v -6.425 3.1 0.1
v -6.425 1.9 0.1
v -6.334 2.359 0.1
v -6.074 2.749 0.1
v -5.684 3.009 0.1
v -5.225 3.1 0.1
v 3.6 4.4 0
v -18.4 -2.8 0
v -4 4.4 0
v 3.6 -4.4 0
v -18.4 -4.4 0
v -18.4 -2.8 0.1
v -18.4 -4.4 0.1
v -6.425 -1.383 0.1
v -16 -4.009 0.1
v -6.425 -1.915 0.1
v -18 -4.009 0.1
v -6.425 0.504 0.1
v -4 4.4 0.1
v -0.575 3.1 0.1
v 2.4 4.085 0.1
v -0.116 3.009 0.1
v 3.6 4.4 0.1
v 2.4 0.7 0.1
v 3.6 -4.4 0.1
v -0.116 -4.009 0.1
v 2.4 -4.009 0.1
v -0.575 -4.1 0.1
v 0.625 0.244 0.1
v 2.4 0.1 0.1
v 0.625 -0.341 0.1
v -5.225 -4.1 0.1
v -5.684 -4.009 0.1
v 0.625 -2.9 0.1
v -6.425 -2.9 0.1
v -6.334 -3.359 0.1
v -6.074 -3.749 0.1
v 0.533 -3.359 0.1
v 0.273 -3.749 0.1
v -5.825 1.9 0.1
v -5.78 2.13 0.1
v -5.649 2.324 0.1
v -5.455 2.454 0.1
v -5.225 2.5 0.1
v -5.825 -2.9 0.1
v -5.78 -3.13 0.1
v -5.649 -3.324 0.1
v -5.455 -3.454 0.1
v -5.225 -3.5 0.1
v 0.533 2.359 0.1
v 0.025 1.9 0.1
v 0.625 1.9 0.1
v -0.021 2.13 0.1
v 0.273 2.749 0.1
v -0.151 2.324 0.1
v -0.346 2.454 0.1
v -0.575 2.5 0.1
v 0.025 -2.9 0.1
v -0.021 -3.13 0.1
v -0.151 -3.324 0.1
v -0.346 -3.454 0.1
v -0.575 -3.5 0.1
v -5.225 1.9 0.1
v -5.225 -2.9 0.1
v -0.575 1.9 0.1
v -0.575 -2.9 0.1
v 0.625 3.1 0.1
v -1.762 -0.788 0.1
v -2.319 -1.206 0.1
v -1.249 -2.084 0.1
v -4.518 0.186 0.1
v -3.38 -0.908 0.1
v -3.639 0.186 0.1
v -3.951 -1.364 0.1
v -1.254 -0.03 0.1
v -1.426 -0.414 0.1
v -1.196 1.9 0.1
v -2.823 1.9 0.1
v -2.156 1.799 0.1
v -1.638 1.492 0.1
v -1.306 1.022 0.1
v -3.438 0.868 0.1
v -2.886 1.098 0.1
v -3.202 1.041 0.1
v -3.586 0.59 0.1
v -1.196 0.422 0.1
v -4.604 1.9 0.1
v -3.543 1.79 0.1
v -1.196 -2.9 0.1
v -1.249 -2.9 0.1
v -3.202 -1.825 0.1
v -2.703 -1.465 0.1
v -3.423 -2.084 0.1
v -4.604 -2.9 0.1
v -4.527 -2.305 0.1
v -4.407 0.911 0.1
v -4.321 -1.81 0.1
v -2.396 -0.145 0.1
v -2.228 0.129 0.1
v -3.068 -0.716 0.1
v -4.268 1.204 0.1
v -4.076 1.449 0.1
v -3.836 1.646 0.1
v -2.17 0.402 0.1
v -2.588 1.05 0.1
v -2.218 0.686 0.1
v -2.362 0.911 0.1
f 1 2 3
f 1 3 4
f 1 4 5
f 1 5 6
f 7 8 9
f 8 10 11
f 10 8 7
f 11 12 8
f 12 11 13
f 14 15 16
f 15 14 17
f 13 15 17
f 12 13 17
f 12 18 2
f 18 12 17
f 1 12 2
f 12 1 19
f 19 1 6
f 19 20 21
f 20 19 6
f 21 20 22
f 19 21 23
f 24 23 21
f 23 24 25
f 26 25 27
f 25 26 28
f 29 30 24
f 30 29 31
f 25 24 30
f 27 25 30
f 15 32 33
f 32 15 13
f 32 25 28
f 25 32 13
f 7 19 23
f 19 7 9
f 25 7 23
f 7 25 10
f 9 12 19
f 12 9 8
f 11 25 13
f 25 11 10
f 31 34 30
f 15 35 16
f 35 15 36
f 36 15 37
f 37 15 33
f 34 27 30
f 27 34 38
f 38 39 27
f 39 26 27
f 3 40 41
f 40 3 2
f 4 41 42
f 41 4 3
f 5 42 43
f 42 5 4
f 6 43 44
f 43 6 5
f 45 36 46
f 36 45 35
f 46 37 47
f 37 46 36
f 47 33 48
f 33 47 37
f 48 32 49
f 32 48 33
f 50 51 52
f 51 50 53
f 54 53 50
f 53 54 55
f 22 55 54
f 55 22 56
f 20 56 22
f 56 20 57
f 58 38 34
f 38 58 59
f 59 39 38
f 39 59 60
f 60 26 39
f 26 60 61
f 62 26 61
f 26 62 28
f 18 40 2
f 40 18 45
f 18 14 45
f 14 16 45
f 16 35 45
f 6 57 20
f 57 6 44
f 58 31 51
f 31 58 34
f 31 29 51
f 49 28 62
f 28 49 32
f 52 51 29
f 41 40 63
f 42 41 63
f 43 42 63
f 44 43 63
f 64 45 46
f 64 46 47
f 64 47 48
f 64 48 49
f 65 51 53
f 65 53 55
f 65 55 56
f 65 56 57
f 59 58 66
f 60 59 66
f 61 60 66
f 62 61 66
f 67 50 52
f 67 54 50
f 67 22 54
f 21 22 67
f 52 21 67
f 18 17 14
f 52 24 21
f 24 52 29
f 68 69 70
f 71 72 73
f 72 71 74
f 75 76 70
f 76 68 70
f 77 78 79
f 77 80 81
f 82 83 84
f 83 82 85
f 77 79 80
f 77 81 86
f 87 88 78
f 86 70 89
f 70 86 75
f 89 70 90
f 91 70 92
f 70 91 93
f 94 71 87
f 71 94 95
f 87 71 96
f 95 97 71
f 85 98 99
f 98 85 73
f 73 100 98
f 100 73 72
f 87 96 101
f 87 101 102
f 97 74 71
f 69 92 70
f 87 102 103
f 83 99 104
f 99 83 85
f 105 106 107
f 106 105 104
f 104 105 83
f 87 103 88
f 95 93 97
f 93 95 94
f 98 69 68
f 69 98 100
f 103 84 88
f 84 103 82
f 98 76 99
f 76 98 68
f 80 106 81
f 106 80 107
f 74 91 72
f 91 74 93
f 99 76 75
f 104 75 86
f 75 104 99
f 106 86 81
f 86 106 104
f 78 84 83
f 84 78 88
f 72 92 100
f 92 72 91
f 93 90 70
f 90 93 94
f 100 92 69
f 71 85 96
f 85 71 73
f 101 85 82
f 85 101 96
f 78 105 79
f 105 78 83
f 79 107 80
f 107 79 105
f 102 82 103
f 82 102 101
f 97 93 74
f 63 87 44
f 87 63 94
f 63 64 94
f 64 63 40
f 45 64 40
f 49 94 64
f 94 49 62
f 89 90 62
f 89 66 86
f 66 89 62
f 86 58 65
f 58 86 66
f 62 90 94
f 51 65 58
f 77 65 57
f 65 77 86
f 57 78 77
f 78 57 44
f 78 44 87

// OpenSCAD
// file: ../p/1-4ndis.scad
use <../lib.scad>
function ldraw_lib__1_4ndis() = [
// 0 Disc Negative 0.25
// 0 Name: 1-4ndis.dat
// 0 Author: James Jessiman
// 0 !LDRAW_ORG Primitive UPDATE 2012-01
// 0 !LICENSE Licensed under CC BY 2.0 and CC BY 4.0 : see CAreadme.txt
// 
// 0 BFC CERTIFY CCW
  [0,"BFC","CERTIFY"],
  [0,"BFC","CCW"],
// 
// 0 !HISTORY 2002-03-23 [sbliss] Added BFC Statement
// 0 !HISTORY 2002-04-25 [PTadmin] Official Update 2002-02
// 0 !HISTORY 2007-06-22 [PTadmin] Header formatted for Contributor Agreement
// 0 !HISTORY 2008-07-01 [PTadmin] Official Update 2008-01
// 0 !HISTORY 2012-02-16 [Philo] Changed to CCW
// 0 !HISTORY 2012-03-30 [PTadmin] Official Update 2012-01
// 
// 
// 3 16 0.9239 0 0.3827 1 0 0 1 0 1
  [3,16,0.9239,0,0.3827,1,0,0,1,0,1],
// 3 16 0.7071 0 0.7071 0.9239 0 0.3827 1 0 1
  [3,16,0.7071,0,0.7071,0.9239,0,0.3827,1,0,1],
// 3 16 0.3827 0 0.9239 0.7071 0 0.7071 1 0 1
  [3,16,0.3827,0,0.9239,0.7071,0,0.7071,1,0,1],
// 3 16 0 0 1 0.3827 0 0.9239 1 0 1
  [3,16,0,0,1,0.3827,0,0.9239,1,0,1],
];
module ldraw_lib__1_4ndis(step=0, col=false, unit=2/5, alt=false, line=0.2, solid=!$preview)
    makepoly(ldraw_lib__1_4ndis(), step=step, col=col, unit=unit, alt=alt, line=line, solid=solid);
ldraw_lib__1_4ndis(line=0.2);
// file: ../p/3-16ndis.scad
use <../lib.scad>
function ldraw_lib__3_16ndis() = [
// 0 Disc Negative 0.1875
// 0 Name: 3-16ndis.dat
// 0 Author: Guy Vivan [guyvivan]
// 0 !LDRAW_ORG Primitive UPDATE 2009-01
// 0 !LICENSE Licensed under CC BY 2.0 and CC BY 4.0 : see CAreadme.txt
// 
// 0 BFC CERTIFY CCW
  [0,"BFC","CERTIFY"],
  [0,"BFC","CCW"],
// 
// 0 !HISTORY 2009-05-02 [PTadmin] Official Update 2009-01
// 
// 
// 3 16 1 0 1 0.9239 0 0.3827 1 0 0
  [3,16,1,0,1,0.9239,0,0.3827,1,0,0],
// 3 16 1 0 1 0.7071 0 0.7071 0.9239 0 0.3827
  [3,16,1,0,1,0.7071,0,0.7071,0.9239,0,0.3827],
// 3 16 1 0 1 0.3827 0 0.9239 0.7071 0 0.7071
  [3,16,1,0,1,0.3827,0,0.9239,0.7071,0,0.7071],
// 
// 0 end of file
// 
];
module ldraw_lib__3_16ndis(step=0, col=false, unit=2/5, alt=false, line=0.2, solid=!$preview)
    makepoly(ldraw_lib__3_16ndis(), step=step, col=col, unit=unit, alt=alt, line=line, solid=solid);
ldraw_lib__3_16ndis(line=0.2);
// file: ../p/1-4ring1.scad
use <../lib.scad>
function ldraw_lib__1_4ring1() = [
// 0 Ring  1 x 0.25
// 0 Name: 1-4ring1.dat
// 0 Author: Chris Dee [cwdee]
// 0 !LDRAW_ORG Primitive UPDATE 2012-01
// 0 !LICENSE Licensed under CC BY 2.0 and CC BY 4.0 : see CAreadme.txt
// 
// 0 BFC CERTIFY CCW
  [0,"BFC","CERTIFY"],
  [0,"BFC","CCW"],
// 
// 0 !HISTORY 2000-05-07 [PTadmin] Official Update 2000-01
// 0 !HISTORY 2002-11-22 [hafhead] Added BFC statement
// 0 !HISTORY 2002-11-30 [PTadmin] Official Update 2002-05
// 0 !HISTORY 2007-06-22 [PTadmin] Header formatted for Contributor Agreement
// 0 !HISTORY 2008-07-01 [PTadmin] Official Update 2008-01
// 0 !HISTORY 2012-02-16 [Philo] Changed to CCW
// 0 !HISTORY 2012-03-30 [PTadmin] Official Update 2012-01
// 
// 
// 4 16 2 0 0 1.8478 0 0.7654 0.9239 0 0.3827 1 0 0
  [4,16,2,0,0,1.8478,0,0.7654,0.9239,0,0.3827,1,0,0],
// 4 16 1.8478 0 0.7654 1.4142 0 1.4142 0.7071 0 0.7071 0.9239 0 0.3827
  [4,16,1.8478,0,0.7654,1.4142,0,1.4142,0.7071,0,0.7071,0.9239,0,0.3827],
// 4 16 1.4142 0 1.4142 0.7654 0 1.8478 0.3827 0 0.9239 0.7071 0 0.7071
  [4,16,1.4142,0,1.4142,0.7654,0,1.8478,0.3827,0,0.9239,0.7071,0,0.7071],
// 4 16 0.7654 0 1.8478 0 0 2 0 0 1 0.3827 0 0.9239
  [4,16,0.7654,0,1.8478,0,0,2,0,0,1,0.3827,0,0.9239],
];
module ldraw_lib__1_4ring1(step=0, col=false, unit=2/5, alt=false, line=0.2, solid=!$preview)
    makepoly(ldraw_lib__1_4ring1(), step=step, col=col, unit=unit, alt=alt, line=line, solid=solid);
ldraw_lib__1_4ring1(line=0.2);
// file: ../p/1-4disc.scad
use <../lib.scad>
function ldraw_lib__1_4disc() = [
// 0 Disc 0.25
// 0 Name: 1-4disc.dat
// 0 Author: James Jessiman
// 0 !LDRAW_ORG Primitive UPDATE 2002-02
// 0 !LICENSE Licensed under CC BY 2.0 and CC BY 4.0 : see CAreadme.txt
// 
// 0 BFC CERTIFY CCW
  [0,"BFC","CERTIFY"],
  [0,"BFC","CCW"],
// 
// 0 !HISTORY 2002-03-23 [sbliss] Added BFC statement.
// 0 !HISTORY 2002-04-25 [PTadmin] Official Update 2002-02
// 0 !HISTORY 2007-06-22 [PTadmin] Header formatted for Contributor Agreement
// 0 !HISTORY 2008-07-01 [PTadmin] Official Update 2008-01
// 
// 
// 3 16 0 0 0 1 0 0 0.9239 0 0.3827
  [3,16,0,0,0,1,0,0,0.9239,0,0.3827],
// 3 16 0 0 0 0.9239 0 0.3827 0.7071 0 0.7071
  [3,16,0,0,0,0.9239,0,0.3827,0.7071,0,0.7071],
// 3 16 0 0 0 0.7071 0 0.7071 0.3827 0 0.9239
  [3,16,0,0,0,0.7071,0,0.7071,0.3827,0,0.9239],
// 3 16 0 0 0 0.3827 0 0.9239 0 0 1
  [3,16,0,0,0,0.3827,0,0.9239,0,0,1],
// 0
];
module ldraw_lib__1_4disc(step=0, col=false, unit=2/5, alt=false, line=0.2, solid=!$preview)
    makepoly(ldraw_lib__1_4disc(), step=step, col=col, unit=unit, alt=alt, line=line, solid=solid);
ldraw_lib__1_4disc(line=0.2);
// file: ../p/type-swiss721bt-bold-n2.scad
use <../lib.scad>
function ldraw_lib__type_swiss721bt_bold_n2() = [
// 0 Type Swiss721BT Number "2" Bold
// 0 Name: type-swiss721bt-bold-n2.dat
// 0 Author: Ulrich Röder [UR]
// 0 !LDRAW_ORG Primitive UPDATE 2019-01
// 0 !LICENSE Licensed under CC BY 2.0 and CC BY 4.0 : see CAreadme.txt
// 
// 0 BFC CERTIFY CCW
  [0,"BFC","CERTIFY"],
  [0,"BFC","CCW"],
// 
// 0 !HISTORY 2019-06-28 [PTadmin] Official Update 2019-01
// 
// 
// 0 // Main
// 3 16 .237 0 -.06 .121 0 -.147 .344 0 -.33
  [3,16,.237,0,-.06,.121,0,-.147,.344,0,-.33],
// 4 16 -.154 0 .143 -.337 0 .143 -.219 0 -.18 -.1 0 -.085
  [4,16,-.154,0,.143,-.337,0,.143,-.219,0,-.18,-.1,0,-.085],
// 3 16 .343 0 .098 .307 0 .018 .344 0 -.33
  [3,16,.343,0,.098,.307,0,.018,.344,0,-.33],
// 3 16 .307 0 .018 .237 0 -.06 .344 0 -.33
  [3,16,.307,0,.018,.237,0,-.06,.344,0,-.33],
// 3 16 .355 0 .5 .016 0 .5 .155 0 .479
  [3,16,.355,0,.5,.016,0,.5,.155,0,.479],
// 3 16 .355 0 .5 .263 0 .415 .332 0 .317
  [3,16,.355,0,.5,.263,0,.415,.332,0,.317],
// 4 16 -.112 0 .285 -.143 0 .227 .003 0 .333 -.063 0 .321
  [4,16,-.112,0,.285,-.143,0,.227,.003,0,.333,-.063,0,.321],
// 3 16 .355 0 .5 .155 0 .479 .263 0 .415
  [3,16,.355,0,.5,.155,0,.479,.263,0,.415],
// 3 16 .355 0 .5 .332 0 .317 .355 0 .192
  [3,16,.355,0,.5,.332,0,.317,.355,0,.192],
// 3 16 -.355 0 .5 -.134 0 .477 .016 0 .5
  [3,16,-.355,0,.5,-.134,0,.477,.016,0,.5],
// 4 16 .355 0 -.5 .355 0 .192 .343 0 .098 .344 0 -.33
  [4,16,.355,0,-.5,.355,0,.192,.343,0,.098,.344,0,-.33],
// 3 16 .355 0 -.5 .344 0 -.33 .344 0 -.5
  [3,16,.355,0,-.5,.344,0,-.33,.344,0,-.5],
// 4 16 -.109 0 -.33 .344 0 -.33 .041 0 -.201 -.063 0 -.276
  [4,16,-.109,0,-.33,.344,0,-.33,.041,0,-.201,-.063,0,-.276],
// 4 16 -.339 0 -.376 -.337 0 .143 -.355 0 .5 -.355 0 -.5
  [4,16,-.339,0,-.376,-.337,0,.143,-.355,0,.5,-.355,0,-.5],
// 3 16 -.355 0 .5 -.337 0 .143 -.314 0 .294
  [3,16,-.355,0,.5,-.337,0,.143,-.314,0,.294],
// 3 16 -.339 0 -.376 -.296 0 -.273 -.337 0 .143
  [3,16,-.339,0,-.376,-.296,0,-.273,-.337,0,.143],
// 4 16 .14 0 .131 -.143 0 .227 -.154 0 .143 .105 0 .074
  [4,16,.14,0,.131,-.143,0,.227,-.154,0,.143,.105,0,.074],
// 4 16 -.1 0 -.085 -.035 0 -.045 .105 0 .074 -.154 0 .143
  [4,16,-.1,0,-.085,-.035,0,-.045,.105,0,.074,-.154,0,.143],
// 3 16 -.355 0 .5 -.314 0 .294 -.285 0 .355
  [3,16,-.355,0,.5,-.314,0,.294,-.285,0,.355],
// 3 16 -.355 0 .5 -.285 0 .355 -.245 0 .406
  [3,16,-.355,0,.5,-.285,0,.355,-.245,0,.406],
// 3 16 -.296 0 -.273 -.219 0 -.18 -.337 0 .143
  [3,16,-.296,0,-.273,-.219,0,-.18,-.337,0,.143],
// 3 16 .121 0 -.147 .041 0 -.201 .344 0 -.33
  [3,16,.121,0,-.147,.041,0,-.201,.344,0,-.33],
// 3 16 -.355 0 .5 -.245 0 .406 -.195 0 .447
  [3,16,-.355,0,.5,-.245,0,.406,-.195,0,.447],
// 4 16 .152 0 .188 .003 0 .333 -.143 0 .227 .14 0 .131
  [4,16,.152,0,.188,.003,0,.333,-.143,0,.227,.14,0,.131],
// 4 16 .112 0 .294 .065 0 .323 .152 0 .188 .142 0 .247
  [4,16,.112,0,.294,.065,0,.323,.152,0,.188,.142,0,.247],
// 3 16 .152 0 .188 .065 0 .323 .003 0 .333
  [3,16,.152,0,.188,.065,0,.323,.003,0,.333],
// 3 16 -.355 0 .5 -.195 0 .447 -.134 0 .477
  [3,16,-.355,0,.5,-.195,0,.447,-.134,0,.477],
// 
// 0 // Black
// 4 0 -.296 0 -.273 -.339 0 -.376 -.355 0 -.5 -.109 0 -.33
  [4,0,-.296,0,-.273,-.339,0,-.376,-.355,0,-.5,-.109,0,-.33],
// 4 0 -.035 0 -.045 .121 0 -.147 .237 0 -.06 .105 0 .074
  [4,0,-.035,0,-.045,.121,0,-.147,.237,0,-.06,.105,0,.074],
// 4 0 -.134 0 .477 -.195 0 .447 -.112 0 .285 -.063 0 .321
  [4,0,-.134,0,.477,-.195,0,.447,-.112,0,.285,-.063,0,.321],
// 4 0 .237 0 -.06 .307 0 .018 .14 0 .131 .105 0 .074
  [4,0,.237,0,-.06,.307,0,.018,.14,0,.131,.105,0,.074],
// 4 0 .112 0 .294 .142 0 .247 .332 0 .317 .263 0 .415
  [4,0,.112,0,.294,.142,0,.247,.332,0,.317,.263,0,.415],
// 4 0 -.1 0 -.085 -.219 0 -.18 -.109 0 -.33 -.063 0 -.276
  [4,0,-.1,0,-.085,-.219,0,-.18,-.109,0,-.33,-.063,0,-.276],
// 3 0 .14 0 .131 .307 0 .018 .343 0 .098
  [3,0,.14,0,.131,.307,0,.018,.343,0,.098],
// 4 0 .14 0 .131 .343 0 .098 .355 0 .192 .152 0 .188
  [4,0,.14,0,.131,.343,0,.098,.355,0,.192,.152,0,.188],
// 4 0 .152 0 .188 .355 0 .192 .332 0 .317 .142 0 .247
  [4,0,.152,0,.188,.355,0,.192,.332,0,.317,.142,0,.247],
// 4 0 .003 0 .333 .016 0 .5 -.134 0 .477 -.063 0 .321
  [4,0,.003,0,.333,.016,0,.5,-.134,0,.477,-.063,0,.321],
// 4 0 -.035 0 -.045 -.1 0 -.085 -.063 0 -.276 .041 0 -.201
  [4,0,-.035,0,-.045,-.1,0,-.085,-.063,0,-.276,.041,0,-.201],
// 4 0 -.109 0 -.33 -.355 0 -.5 .344 0 -.5 .344 0 -.33
  [4,0,-.109,0,-.33,-.355,0,-.5,.344,0,-.5,.344,0,-.33],
// 3 0 -.035 0 -.045 .041 0 -.201 .121 0 -.147
  [3,0,-.035,0,-.045,.041,0,-.201,.121,0,-.147],
// 4 0 -.314 0 .294 -.337 0 .143 -.154 0 .143 -.143 0 .227
  [4,0,-.314,0,.294,-.337,0,.143,-.154,0,.143,-.143,0,.227],
// 4 0 -.112 0 .285 -.285 0 .355 -.314 0 .294 -.143 0 .227
  [4,0,-.112,0,.285,-.285,0,.355,-.314,0,.294,-.143,0,.227],
// 4 0 .003 0 .333 .065 0 .323 .155 0 .479 .016 0 .5
  [4,0,.003,0,.333,.065,0,.323,.155,0,.479,.016,0,.5],
// 4 0 .263 0 .415 .155 0 .479 .065 0 .323 .112 0 .294
  [4,0,.263,0,.415,.155,0,.479,.065,0,.323,.112,0,.294],
// 4 0 -.285 0 .355 -.112 0 .285 -.195 0 .447 -.245 0 .406
  [4,0,-.285,0,.355,-.112,0,.285,-.195,0,.447,-.245,0,.406],
// 3 0 -.296 0 -.273 -.109 0 -.33 -.219 0 -.18
  [3,0,-.296,0,-.273,-.109,0,-.33,-.219,0,-.18],
];
module ldraw_lib__type_swiss721bt_bold_n2(step=0, col=false, unit=2/5, alt=false, line=0.2, solid=!$preview)
    makepoly(ldraw_lib__type_swiss721bt_bold_n2(), step=step, col=col, unit=unit, alt=alt, line=line, solid=solid);
ldraw_lib__type_swiss721bt_bold_n2(line=0.2);
// file: s/821435as03.scad
use <../../lib.scad>
use <../../p/1-4ndis.scad>
function ldraw_lib__s__821435as03() = [
// 0 ~Sticker Sloped Body for Racing Number
// 0 Name: s\821435as03.dat
// 0 Author: Ulrich Röder [UR]
// 0 !LDRAW_ORG Subpart UPDATE 2019-01
// 0 !LICENSE Licensed under CC BY 2.0 and CC BY 4.0 : see CAreadme.txt
// 
// 0 BFC CERTIFY CCW
  [0,"BFC","CERTIFY"],
  [0,"BFC","CCW"],
// 
// 0 !HISTORY 2019-06-28 [PTadmin] Official Update 2019-01
// 
// 
// 0 // Main
// 1 16 13.063 -.25 4.75 3 0 0 0 1 0 0 0 3 1-4ndis.dat
  [1,16,13.063,-.25,4.75,3,0,0,0,1,0,0,0,3, ldraw_lib__1_4ndis()],
// 3 16 10 0 11 46 0 -7 -9 0 11
  [3,16,10,0,11,46,0,-7,-9,0,11],
// 4 16 -9 0 -11 -9 0 11 46 0 -7 46 0 -11
  [4,16,-9,0,-11,-9,0,11,46,0,-7,46,0,-11],
// 4 16 46 -.25 -11 46 0 -11 46 0 -7 46 -.25 -7
  [4,16,46,-.25,-11,46,0,-11,46,0,-7,46,-.25,-7],
// 4 16 16.063 -.25 -4.788 40 -.25 -10.022 45 -.25 -10.022 16.063 -.25 -3.458
  [4,16,16.063,-.25,-4.788,40,-.25,-10.022,45,-.25,-10.022,16.063,-.25,-3.458],
// 3 16 45 -.25 -10.022 40 -.25 -10.022 46 -.25 -11
  [3,16,45,-.25,-10.022,40,-.25,-10.022,46,-.25,-11],
// 3 16 45 -.25 -10.022 46 -.25 -11 46 -.25 -7
  [3,16,45,-.25,-10.022,46,-.25,-11,46,-.25,-7],
// 4 16 16.063 -.25 4.75 16.063 -.25 1.261 45 -.25 -10.022 46 -.25 -7
  [4,16,16.063,-.25,4.75,16.063,-.25,1.261,45,-.25,-10.022,46,-.25,-7],
// 3 16 16.063 -.25 4.75 46 -.25 -7 16.063 -.25 7.75
  [3,16,16.063,-.25,4.75,46,-.25,-7,16.063,-.25,7.75],
// 3 16 10 -.25 11 16.063 -.25 7.75 46 -.25 -7
  [3,16,10,-.25,11,16.063,-.25,7.75,46,-.25,-7],
// 3 16 13.063 -.25 7.75 16.063 -.25 7.75 10 -.25 11
  [3,16,13.063,-.25,7.75,16.063,-.25,7.75,10,-.25,11],
// 4 16 -6 -.25 10.213 1.438 -.25 7.75 13.063 -.25 7.75 10 -.25 11
  [4,16,-6,-.25,10.213,1.438,-.25,7.75,13.063,-.25,7.75,10,-.25,11],
// 3 16 .2899 -.25 7.5217 1.438 -.25 7.75 -6 -.25 10.213
  [3,16,.2899,-.25,7.5217,1.438,-.25,7.75,-6,-.25,10.213],
// 3 16 -9 -.25 11 -6 -.25 10.213 10 -.25 11
  [3,16,-9,-.25,11,-6,-.25,10.213,10,-.25,11],
// 4 16 -9 -.25 -11 -6 -.25 1.75 -6 -.25 10.213 -9 -.25 11
  [4,16,-9,-.25,-11,-6,-.25,1.75,-6,-.25,10.213,-9,-.25,11],
// 4 16 1.438 -.25 -10.25 .2899 -.25 -10.0217 -6 -.25 -10.022 -9 -.25 -11
  [4,16,1.438,-.25,-10.25,.2899,-.25,-10.0217,-6,-.25,-10.022,-9,-.25,-11],
// 4 16 -1.563 -.25 .61 -6 -.25 1.75 -6 -.25 .25 -1.563 -.25 -.853
  [4,16,-1.563,-.25,.61,-6,-.25,1.75,-6,-.25,.25,-1.563,-.25,-.853],
// 3 16 -6 -.25 .25 -6 -.25 1.75 -9 -.25 -11
  [3,16,-6,-.25,.25,-6,-.25,1.75,-9,-.25,-11],
// 3 16 -6 -.25 .25 -9 -.25 -11 -6 -.25 -10.022
  [3,16,-6,-.25,.25,-9,-.25,-11,-6,-.25,-10.022],
// 4 16 40 -.25 -10.022 14.2111 -.25 -10.0217 13.063 -.25 -10.25 46 -.25 -11
  [4,16,40,-.25,-10.022,14.2111,-.25,-10.0217,13.063,-.25,-10.25,46,-.25,-11],
// 4 16 1.438 -.25 -10.25 -9 -.25 -11 46 -.25 -11 13.063 -.25 -10.25
  [4,16,1.438,-.25,-10.25,-9,-.25,-11,46,-.25,-11,13.063,-.25,-10.25],
// 4 16 -9 -.25 11 10 -.25 11 10 0 11 -9 0 11
  [4,16,-9,-.25,11,10,-.25,11,10,0,11,-9,0,11],
// 4 16 -9 0 11 -9 0 -11 -9 -.25 -11 -9 -.25 11
  [4,16,-9,0,11,-9,0,-11,-9,-.25,-11,-9,-.25,11],
// 4 16 10 -.25 11 46 -.25 -7 46 0 -7 10 0 11
  [4,16,10,-.25,11,46,-.25,-7,46,0,-7,10,0,11],
// 4 16 46 0 -11 46 -.25 -11 -9 -.25 -11 -9 0 -11
  [4,16,46,0,-11,46,-.25,-11,-9,-.25,-11,-9,0,-11],
];
module ldraw_lib__s__821435as03(step=0, col=false, unit=2/5, alt=false, line=0.2, solid=!$preview)
    makepoly(ldraw_lib__s__821435as03(), step=step, col=col, unit=unit, alt=alt, line=line, solid=solid);
ldraw_lib__s__821435as03(line=0.2);
// file: s/821435as02.scad
use <../../lib.scad>
use <../../p/3-16ndis.scad>
function ldraw_lib__s__821435as02() = [
// 0 ~Sticker Upper Triangle with Cutout for Racing Number
// 0 Name: s\821435as02.dat
// 0 Author: Ulrich Röder [UR]
// 0 !LDRAW_ORG Subpart UPDATE 2019-01
// 0 !LICENSE Licensed under CC BY 2.0 and CC BY 4.0 : see CAreadme.txt
// 
// 0 BFC CERTIFY CCW
  [0,"BFC","CERTIFY"],
  [0,"BFC","CCW"],
// 
// 0 !HISTORY 2019-06-28 [PTadmin] Official Update 2019-01
// 
// 
// 0 // Main
// 1 16 1.438 -.25 4.75 -3 0 0 0 1 0 0 0 3 3-16ndis.dat
  [1,16,1.438,-.25,4.75,-3,0,0,0,1,0,0,0,3, ldraw_lib__3_16ndis()],
// 3 16 -1.562 -.25 7.75 .2899 -.25 7.5217 -6 -.25 10.213
  [3,16,-1.562,-.25,7.75,.2899,-.25,7.5217,-6,-.25,10.213],
// 3 16 -1.562 -.25 7.75 -6 -.25 10.213 -1.562 -.25 4.75
  [3,16,-1.562,-.25,7.75,-6,-.25,10.213,-1.562,-.25,4.75],
// 3 16 16.063 -.25 -3.458 45 -.25 -10.022 16.063 -.25 1.261
  [3,16,16.063,-.25,-3.458,45,-.25,-10.022,16.063,-.25,1.261],
// 4 16 -6 -.25 1.75 -1.563 -.25 .61 -1.562 -.25 4.75 -6 -.25 10.213
  [4,16,-6,-.25,1.75,-1.563,-.25,.61,-1.562,-.25,4.75,-6,-.25,10.213],
];
module ldraw_lib__s__821435as02(step=0, col=false, unit=2/5, alt=false, line=0.2, solid=!$preview)
    makepoly(ldraw_lib__s__821435as02(), step=step, col=col, unit=unit, alt=alt, line=line, solid=solid);
ldraw_lib__s__821435as02(line=0.2);
// file: s/821435as01.scad
use <../../lib.scad>
use <../../p/1-4disc.scad>
use <../../p/1-4ring1.scad>
function ldraw_lib__s__821435as01() = [
// 0 ~Sticker Lower Triangle and Racing Number Frame
// 0 Name: s\821435as01.dat
// 0 Author: Ulrich Röder [UR]
// 0 !LDRAW_ORG Subpart UPDATE 2019-01
// 0 !LICENSE Licensed under CC BY 2.0 and CC BY 4.0 : see CAreadme.txt
// 
// 0 BFC CERTIFY CCW
  [0,"BFC","CERTIFY"],
  [0,"BFC","CCW"],
// 
// 0 !HISTORY 2019-06-28 [PTadmin] Official Update 2019-01
// 
// 
// 0 // Main
// 
// 3 16 -6 -0.25 0.25 -1.562 -0.25 -7.25 -1.563 -0.25 -0.853
  [3,16,-6,-0.25,0.25,-1.562,-0.25,-7.25,-1.563,-0.25,-0.853],
// 3 16 16.063 -0.25 -4.788 16.063 -0.25 -7.25 40 -0.25 -10.022
  [3,16,16.063,-0.25,-4.788,16.063,-0.25,-7.25,40,-0.25,-10.022],
// 3 16 15.8347 -0.25 -8.3981 40 -0.25 -10.022 16.063 -0.25 -7.25
  [3,16,15.8347,-0.25,-8.3981,40,-0.25,-10.022,16.063,-0.25,-7.25],
// 3 16 15.1843 -0.25 -9.3713 40 -0.25 -10.022 15.8347 -0.25 -8.3981
  [3,16,15.1843,-0.25,-9.3713,40,-0.25,-10.022,15.8347,-0.25,-8.3981],
// 3 16 14.2111 -0.25 -10.0217 40 -0.25 -10.022 15.1843 -0.25 -9.3713
  [3,16,14.2111,-0.25,-10.0217,40,-0.25,-10.022,15.1843,-0.25,-9.3713],
// 4 16 -6 -0.25 0.25 -6 -0.25 -10.022 -1.3337 -0.25 -8.3981 -1.562 -0.25 -7.25
  [4,16,-6,-0.25,0.25,-6,-0.25,-10.022,-1.3337,-0.25,-8.3981,-1.562,-0.25,-7.25],
// 3 16 -6 -0.25 -10.022 -0.6833 -0.25 -9.3713 -1.3337 -0.25 -8.3981
  [3,16,-6,-0.25,-10.022,-0.6833,-0.25,-9.3713,-1.3337,-0.25,-8.3981],
// 3 16 -6 -0.25 -10.022 0.2899 -0.25 -10.0217 -0.6833 -0.25 -9.3713
  [3,16,-6,-0.25,-10.022,0.2899,-0.25,-10.0217,-0.6833,-0.25,-9.3713],
// 
// 0 // Black
// 1 0 13.063 -.25 4.75 1.5 0 0 0 1 0 0 0 1.5 1-4ring1.dat
  [1,0,13.063,-.25,4.75,1.5,0,0,0,1,0,0,0,1.5, ldraw_lib__1_4ring1()],
// 1 0 13.063 -.25 -7.25 1.5 0 0 0 1 0 0 0 -1.5 1-4ring1.dat
  [1,0,13.063,-.25,-7.25,1.5,0,0,0,1,0,0,0,-1.5, ldraw_lib__1_4ring1()],
// 1 0 1.438 -.25 4.75 -1.5 0 0 0 1 0 0 0 1.5 1-4ring1.dat
  [1,0,1.438,-.25,4.75,-1.5,0,0,0,1,0,0,0,1.5, ldraw_lib__1_4ring1()],
// 1 0 1.438 -.25 -7.25 -1.5 0 0 0 1 0 0 0 -1.5 1-4ring1.dat
  [1,0,1.438,-.25,-7.25,-1.5,0,0,0,1,0,0,0,-1.5, ldraw_lib__1_4ring1()],
// 4 0 14.563 -0.25 4.75 14.563 -0.25 -7.25 16.063 -0.25 1.261 16.063 -0.25 4.75
  [4,0,14.563,-0.25,4.75,14.563,-0.25,-7.25,16.063,-0.25,1.261,16.063,-0.25,4.75],
// 3 0 14.563 -0.25 -7.25 16.063 -0.25 -3.458 16.063 -0.25 1.261
  [3,0,14.563,-0.25,-7.25,16.063,-0.25,-3.458,16.063,-0.25,1.261],
// 3 0 14.563 -0.25 -7.25 16.063 -0.25 -4.788 16.063 -0.25 -3.458
  [3,0,14.563,-0.25,-7.25,16.063,-0.25,-4.788,16.063,-0.25,-3.458],
// 3 0 14.563 -0.25 -7.25 16.063 -0.25 -7.25 16.063 -0.25 -4.788
  [3,0,14.563,-0.25,-7.25,16.063,-0.25,-7.25,16.063,-0.25,-4.788],
// 4 0 13.063 -0.25 6.25 13.063 -0.25 7.75 1.438 -0.25 7.75 1.438 -0.25 6.25
  [4,0,13.063,-0.25,6.25,13.063,-0.25,7.75,1.438,-0.25,7.75,1.438,-0.25,6.25],
// 4 0 -0.062 -0.25 4.75 -1.563 -0.25 -0.853 -1.562 -0.25 -7.25 -0.062 -0.25 -7.25
  [4,0,-0.062,-0.25,4.75,-1.563,-0.25,-0.853,-1.562,-0.25,-7.25,-0.062,-0.25,-7.25],
// 3 0 -0.062 -0.25 4.75 -1.563 -0.25 0.61 -1.563 -0.25 -0.853
  [3,0,-0.062,-0.25,4.75,-1.563,-0.25,0.61,-1.563,-0.25,-0.853],
// 4 0 1.438 -0.25 -10.25 13.063 -0.25 -10.25 13.063 -0.25 -8.75 1.438 -0.25 -8.75
  [4,0,1.438,-0.25,-10.25,13.063,-0.25,-10.25,13.063,-0.25,-8.75,1.438,-0.25,-8.75],
// 3 0 -1.563 -0.25 0.61 -0.062 -0.25 4.75 -1.562 -0.25 4.75
  [3,0,-1.563,-0.25,0.61,-0.062,-0.25,4.75,-1.562,-0.25,4.75],
// 
// 0 // White
// 1 15 13.063 -.25 4.75 1.5 0 0 0 1 0 0 0 1.5 1-4disc.dat
  [1,15,13.063,-.25,4.75,1.5,0,0,0,1,0,0,0,1.5, ldraw_lib__1_4disc()],
// 1 15 13.063 -.25 -7.25 1.5 0 0 0 1 0 0 0 -1.5 1-4disc.dat
  [1,15,13.063,-.25,-7.25,1.5,0,0,0,1,0,0,0,-1.5, ldraw_lib__1_4disc()],
// 1 15 1.438 -.25 4.75 -1.5 0 0 0 1 0 0 0 1.5 1-4disc.dat
  [1,15,1.438,-.25,4.75,-1.5,0,0,0,1,0,0,0,1.5, ldraw_lib__1_4disc()],
// 1 15 1.438 -.25 -7.25 -1.5 0 0 0 1 0 0 0 -1.5 1-4disc.dat
  [1,15,1.438,-.25,-7.25,-1.5,0,0,0,1,0,0,0,-1.5, ldraw_lib__1_4disc()],
];
module ldraw_lib__s__821435as01(step=0, col=false, unit=2/5, alt=false, line=0.2, solid=!$preview)
    makepoly(ldraw_lib__s__821435as01(), step=step, col=col, unit=unit, alt=alt, line=line, solid=solid);
ldraw_lib__s__821435as01(line=0.2);
// main file
use <../lib.scad>
use <s/821435as01.scad>
use <s/821435as02.scad>
use <s/821435as03.scad>
use <../p/type-swiss721bt-bold-n2.scad>
function ldraw_lib__821435d() = [
// 0 Sticker with White/Black Triangles and Racing Number "2", Left
// 0 Name: 821435d.dat
// 0 Author: Ulrich Röder [UR]
// 0 !LDRAW_ORG Part UPDATE 2019-01
// 0 !LICENSE Licensed under CC BY 2.0 and CC BY 4.0 : see CAreadme.txt
// 
// 0 BFC CERTIFY CCW
  [0,"BFC","CERTIFY"],
  [0,"BFC","CCW"],
// 
// 0 !KEYWORDS cup, Racers, Set 6539
// 
// 0 !HISTORY 2019-06-28 [PTadmin] Official Update 2019-01
// 
// 
// 0 // Main
// 
// 1 16 0 0 0 -1 0 0 0 1 0 0 0 1 s\821435as03.dat
  [1,16,0,0,0,-1,0,0,0,1,0,0,0,1, ldraw_lib__s__821435as03()],
// 
// 0 // Black
// 1 0 0 0 0 -1 0 0 0 1 0 0 0 1 s\821435as01.dat
  [1,0,0,0,0,-1,0,0,0,1,0,0,0,1, ldraw_lib__s__821435as01()],
// 
// 0 // White
// 1 15 0 0 0 -1 0 0 0 1 0 0 0 1 s\821435as02.dat
  [1,15,0,0,0,-1,0,0,0,1,0,0,0,1, ldraw_lib__s__821435as02()],
// 1 15 -7.25 -.25 -1.25 12 0 0 0 1 0 0 0 12 type-swiss721bt-bold-n2.dat
  [1,15,-7.25,-.25,-1.25,12,0,0,0,1,0,0,0,12, ldraw_lib__type_swiss721bt_bold_n2()],
// 4 15 -11.51 -.25 -7.25 -11.51 -.25 4.75 -13.063 -.25 6.25 -13.063 -.25 4.75
  [4,15,-11.51,-.25,-7.25,-11.51,-.25,4.75,-13.063,-.25,6.25,-13.063,-.25,4.75],
// 4 15 -13.063 -.25 4.75 -14.563 -.25 4.75 -13.063 -.25 -7.25 -11.51 -.25 -7.25
  [4,15,-13.063,-.25,4.75,-14.563,-.25,4.75,-13.063,-.25,-7.25,-11.51,-.25,-7.25],
// 3 15 -14.563 -.25 -7.25 -13.063 -.25 -7.25 -14.563 -.25 4.75
  [3,15,-14.563,-.25,-7.25,-13.063,-.25,-7.25,-14.563,-.25,4.75],
// 4 15 -1.438 -.25 -8.75 -11.51 -.25 -7.25 -13.063 -.25 -7.25 -13.063 -.25 -8.75
  [4,15,-1.438,-.25,-8.75,-11.51,-.25,-7.25,-13.063,-.25,-7.25,-13.063,-.25,-8.75],
// 3 15 -2.99 -.25 -7.25 -3.122 -.25 -7.25 -1.438 -.25 -8.75
  [3,15,-2.99,-.25,-7.25,-3.122,-.25,-7.25,-1.438,-.25,-8.75],
// 4 15 -2.99 -.25 1.054 -2.99 -.25 -7.25 -1.438 -.25 -8.75 -1.438 -.25 -7.25
  [4,15,-2.99,-.25,1.054,-2.99,-.25,-7.25,-1.438,-.25,-8.75,-1.438,-.25,-7.25],
// 4 15 -1.438 -.25 4.75 -2.99 -.25 1.054 -1.438 -.25 -7.25 .062 -.25 -7.25
  [4,15,-1.438,-.25,4.75,-2.99,-.25,1.054,-1.438,-.25,-7.25,.062,-.25,-7.25],
// 3 15 -1.438 -.25 -8.75 -3.122 -.25 -7.25 -11.51 -.25 -7.25
  [3,15,-1.438,-.25,-8.75,-3.122,-.25,-7.25,-11.51,-.25,-7.25],
// 3 15 .062 -.25 4.75 -1.438 -.25 4.75 .062 -.25 -7.25
  [3,15,.062,-.25,4.75,-1.438,-.25,4.75,.062,-.25,-7.25],
// 4 15 -1.438 -.25 6.25 -2.99 -.25 4.75 -2.99 -.25 1.054 -1.438 -.25 4.75
  [4,15,-1.438,-.25,6.25,-2.99,-.25,4.75,-2.99,-.25,1.054,-1.438,-.25,4.75],
// 4 15 -13.063 -.25 6.25 -7.058 -.25 4.75 -2.99 -.25 4.75 -1.438 -.25 6.25
  [4,15,-13.063,-.25,6.25,-7.058,-.25,4.75,-2.99,-.25,4.75,-1.438,-.25,6.25],
// 3 15 -7.058 -.25 4.75 -13.063 -.25 6.25 -11.51 -.25 4.75
  [3,15,-7.058,-.25,4.75,-13.063,-.25,6.25,-11.51,-.25,4.75],
];
module ldraw_lib__821435d(step=0, col=false, unit=2/5, alt=false, line=0.2, solid=!$preview)
    makepoly(ldraw_lib__821435d(), step=step, col=col, unit=unit, alt=alt, line=line, solid=solid);
ldraw_lib__821435d(line=0.2);
